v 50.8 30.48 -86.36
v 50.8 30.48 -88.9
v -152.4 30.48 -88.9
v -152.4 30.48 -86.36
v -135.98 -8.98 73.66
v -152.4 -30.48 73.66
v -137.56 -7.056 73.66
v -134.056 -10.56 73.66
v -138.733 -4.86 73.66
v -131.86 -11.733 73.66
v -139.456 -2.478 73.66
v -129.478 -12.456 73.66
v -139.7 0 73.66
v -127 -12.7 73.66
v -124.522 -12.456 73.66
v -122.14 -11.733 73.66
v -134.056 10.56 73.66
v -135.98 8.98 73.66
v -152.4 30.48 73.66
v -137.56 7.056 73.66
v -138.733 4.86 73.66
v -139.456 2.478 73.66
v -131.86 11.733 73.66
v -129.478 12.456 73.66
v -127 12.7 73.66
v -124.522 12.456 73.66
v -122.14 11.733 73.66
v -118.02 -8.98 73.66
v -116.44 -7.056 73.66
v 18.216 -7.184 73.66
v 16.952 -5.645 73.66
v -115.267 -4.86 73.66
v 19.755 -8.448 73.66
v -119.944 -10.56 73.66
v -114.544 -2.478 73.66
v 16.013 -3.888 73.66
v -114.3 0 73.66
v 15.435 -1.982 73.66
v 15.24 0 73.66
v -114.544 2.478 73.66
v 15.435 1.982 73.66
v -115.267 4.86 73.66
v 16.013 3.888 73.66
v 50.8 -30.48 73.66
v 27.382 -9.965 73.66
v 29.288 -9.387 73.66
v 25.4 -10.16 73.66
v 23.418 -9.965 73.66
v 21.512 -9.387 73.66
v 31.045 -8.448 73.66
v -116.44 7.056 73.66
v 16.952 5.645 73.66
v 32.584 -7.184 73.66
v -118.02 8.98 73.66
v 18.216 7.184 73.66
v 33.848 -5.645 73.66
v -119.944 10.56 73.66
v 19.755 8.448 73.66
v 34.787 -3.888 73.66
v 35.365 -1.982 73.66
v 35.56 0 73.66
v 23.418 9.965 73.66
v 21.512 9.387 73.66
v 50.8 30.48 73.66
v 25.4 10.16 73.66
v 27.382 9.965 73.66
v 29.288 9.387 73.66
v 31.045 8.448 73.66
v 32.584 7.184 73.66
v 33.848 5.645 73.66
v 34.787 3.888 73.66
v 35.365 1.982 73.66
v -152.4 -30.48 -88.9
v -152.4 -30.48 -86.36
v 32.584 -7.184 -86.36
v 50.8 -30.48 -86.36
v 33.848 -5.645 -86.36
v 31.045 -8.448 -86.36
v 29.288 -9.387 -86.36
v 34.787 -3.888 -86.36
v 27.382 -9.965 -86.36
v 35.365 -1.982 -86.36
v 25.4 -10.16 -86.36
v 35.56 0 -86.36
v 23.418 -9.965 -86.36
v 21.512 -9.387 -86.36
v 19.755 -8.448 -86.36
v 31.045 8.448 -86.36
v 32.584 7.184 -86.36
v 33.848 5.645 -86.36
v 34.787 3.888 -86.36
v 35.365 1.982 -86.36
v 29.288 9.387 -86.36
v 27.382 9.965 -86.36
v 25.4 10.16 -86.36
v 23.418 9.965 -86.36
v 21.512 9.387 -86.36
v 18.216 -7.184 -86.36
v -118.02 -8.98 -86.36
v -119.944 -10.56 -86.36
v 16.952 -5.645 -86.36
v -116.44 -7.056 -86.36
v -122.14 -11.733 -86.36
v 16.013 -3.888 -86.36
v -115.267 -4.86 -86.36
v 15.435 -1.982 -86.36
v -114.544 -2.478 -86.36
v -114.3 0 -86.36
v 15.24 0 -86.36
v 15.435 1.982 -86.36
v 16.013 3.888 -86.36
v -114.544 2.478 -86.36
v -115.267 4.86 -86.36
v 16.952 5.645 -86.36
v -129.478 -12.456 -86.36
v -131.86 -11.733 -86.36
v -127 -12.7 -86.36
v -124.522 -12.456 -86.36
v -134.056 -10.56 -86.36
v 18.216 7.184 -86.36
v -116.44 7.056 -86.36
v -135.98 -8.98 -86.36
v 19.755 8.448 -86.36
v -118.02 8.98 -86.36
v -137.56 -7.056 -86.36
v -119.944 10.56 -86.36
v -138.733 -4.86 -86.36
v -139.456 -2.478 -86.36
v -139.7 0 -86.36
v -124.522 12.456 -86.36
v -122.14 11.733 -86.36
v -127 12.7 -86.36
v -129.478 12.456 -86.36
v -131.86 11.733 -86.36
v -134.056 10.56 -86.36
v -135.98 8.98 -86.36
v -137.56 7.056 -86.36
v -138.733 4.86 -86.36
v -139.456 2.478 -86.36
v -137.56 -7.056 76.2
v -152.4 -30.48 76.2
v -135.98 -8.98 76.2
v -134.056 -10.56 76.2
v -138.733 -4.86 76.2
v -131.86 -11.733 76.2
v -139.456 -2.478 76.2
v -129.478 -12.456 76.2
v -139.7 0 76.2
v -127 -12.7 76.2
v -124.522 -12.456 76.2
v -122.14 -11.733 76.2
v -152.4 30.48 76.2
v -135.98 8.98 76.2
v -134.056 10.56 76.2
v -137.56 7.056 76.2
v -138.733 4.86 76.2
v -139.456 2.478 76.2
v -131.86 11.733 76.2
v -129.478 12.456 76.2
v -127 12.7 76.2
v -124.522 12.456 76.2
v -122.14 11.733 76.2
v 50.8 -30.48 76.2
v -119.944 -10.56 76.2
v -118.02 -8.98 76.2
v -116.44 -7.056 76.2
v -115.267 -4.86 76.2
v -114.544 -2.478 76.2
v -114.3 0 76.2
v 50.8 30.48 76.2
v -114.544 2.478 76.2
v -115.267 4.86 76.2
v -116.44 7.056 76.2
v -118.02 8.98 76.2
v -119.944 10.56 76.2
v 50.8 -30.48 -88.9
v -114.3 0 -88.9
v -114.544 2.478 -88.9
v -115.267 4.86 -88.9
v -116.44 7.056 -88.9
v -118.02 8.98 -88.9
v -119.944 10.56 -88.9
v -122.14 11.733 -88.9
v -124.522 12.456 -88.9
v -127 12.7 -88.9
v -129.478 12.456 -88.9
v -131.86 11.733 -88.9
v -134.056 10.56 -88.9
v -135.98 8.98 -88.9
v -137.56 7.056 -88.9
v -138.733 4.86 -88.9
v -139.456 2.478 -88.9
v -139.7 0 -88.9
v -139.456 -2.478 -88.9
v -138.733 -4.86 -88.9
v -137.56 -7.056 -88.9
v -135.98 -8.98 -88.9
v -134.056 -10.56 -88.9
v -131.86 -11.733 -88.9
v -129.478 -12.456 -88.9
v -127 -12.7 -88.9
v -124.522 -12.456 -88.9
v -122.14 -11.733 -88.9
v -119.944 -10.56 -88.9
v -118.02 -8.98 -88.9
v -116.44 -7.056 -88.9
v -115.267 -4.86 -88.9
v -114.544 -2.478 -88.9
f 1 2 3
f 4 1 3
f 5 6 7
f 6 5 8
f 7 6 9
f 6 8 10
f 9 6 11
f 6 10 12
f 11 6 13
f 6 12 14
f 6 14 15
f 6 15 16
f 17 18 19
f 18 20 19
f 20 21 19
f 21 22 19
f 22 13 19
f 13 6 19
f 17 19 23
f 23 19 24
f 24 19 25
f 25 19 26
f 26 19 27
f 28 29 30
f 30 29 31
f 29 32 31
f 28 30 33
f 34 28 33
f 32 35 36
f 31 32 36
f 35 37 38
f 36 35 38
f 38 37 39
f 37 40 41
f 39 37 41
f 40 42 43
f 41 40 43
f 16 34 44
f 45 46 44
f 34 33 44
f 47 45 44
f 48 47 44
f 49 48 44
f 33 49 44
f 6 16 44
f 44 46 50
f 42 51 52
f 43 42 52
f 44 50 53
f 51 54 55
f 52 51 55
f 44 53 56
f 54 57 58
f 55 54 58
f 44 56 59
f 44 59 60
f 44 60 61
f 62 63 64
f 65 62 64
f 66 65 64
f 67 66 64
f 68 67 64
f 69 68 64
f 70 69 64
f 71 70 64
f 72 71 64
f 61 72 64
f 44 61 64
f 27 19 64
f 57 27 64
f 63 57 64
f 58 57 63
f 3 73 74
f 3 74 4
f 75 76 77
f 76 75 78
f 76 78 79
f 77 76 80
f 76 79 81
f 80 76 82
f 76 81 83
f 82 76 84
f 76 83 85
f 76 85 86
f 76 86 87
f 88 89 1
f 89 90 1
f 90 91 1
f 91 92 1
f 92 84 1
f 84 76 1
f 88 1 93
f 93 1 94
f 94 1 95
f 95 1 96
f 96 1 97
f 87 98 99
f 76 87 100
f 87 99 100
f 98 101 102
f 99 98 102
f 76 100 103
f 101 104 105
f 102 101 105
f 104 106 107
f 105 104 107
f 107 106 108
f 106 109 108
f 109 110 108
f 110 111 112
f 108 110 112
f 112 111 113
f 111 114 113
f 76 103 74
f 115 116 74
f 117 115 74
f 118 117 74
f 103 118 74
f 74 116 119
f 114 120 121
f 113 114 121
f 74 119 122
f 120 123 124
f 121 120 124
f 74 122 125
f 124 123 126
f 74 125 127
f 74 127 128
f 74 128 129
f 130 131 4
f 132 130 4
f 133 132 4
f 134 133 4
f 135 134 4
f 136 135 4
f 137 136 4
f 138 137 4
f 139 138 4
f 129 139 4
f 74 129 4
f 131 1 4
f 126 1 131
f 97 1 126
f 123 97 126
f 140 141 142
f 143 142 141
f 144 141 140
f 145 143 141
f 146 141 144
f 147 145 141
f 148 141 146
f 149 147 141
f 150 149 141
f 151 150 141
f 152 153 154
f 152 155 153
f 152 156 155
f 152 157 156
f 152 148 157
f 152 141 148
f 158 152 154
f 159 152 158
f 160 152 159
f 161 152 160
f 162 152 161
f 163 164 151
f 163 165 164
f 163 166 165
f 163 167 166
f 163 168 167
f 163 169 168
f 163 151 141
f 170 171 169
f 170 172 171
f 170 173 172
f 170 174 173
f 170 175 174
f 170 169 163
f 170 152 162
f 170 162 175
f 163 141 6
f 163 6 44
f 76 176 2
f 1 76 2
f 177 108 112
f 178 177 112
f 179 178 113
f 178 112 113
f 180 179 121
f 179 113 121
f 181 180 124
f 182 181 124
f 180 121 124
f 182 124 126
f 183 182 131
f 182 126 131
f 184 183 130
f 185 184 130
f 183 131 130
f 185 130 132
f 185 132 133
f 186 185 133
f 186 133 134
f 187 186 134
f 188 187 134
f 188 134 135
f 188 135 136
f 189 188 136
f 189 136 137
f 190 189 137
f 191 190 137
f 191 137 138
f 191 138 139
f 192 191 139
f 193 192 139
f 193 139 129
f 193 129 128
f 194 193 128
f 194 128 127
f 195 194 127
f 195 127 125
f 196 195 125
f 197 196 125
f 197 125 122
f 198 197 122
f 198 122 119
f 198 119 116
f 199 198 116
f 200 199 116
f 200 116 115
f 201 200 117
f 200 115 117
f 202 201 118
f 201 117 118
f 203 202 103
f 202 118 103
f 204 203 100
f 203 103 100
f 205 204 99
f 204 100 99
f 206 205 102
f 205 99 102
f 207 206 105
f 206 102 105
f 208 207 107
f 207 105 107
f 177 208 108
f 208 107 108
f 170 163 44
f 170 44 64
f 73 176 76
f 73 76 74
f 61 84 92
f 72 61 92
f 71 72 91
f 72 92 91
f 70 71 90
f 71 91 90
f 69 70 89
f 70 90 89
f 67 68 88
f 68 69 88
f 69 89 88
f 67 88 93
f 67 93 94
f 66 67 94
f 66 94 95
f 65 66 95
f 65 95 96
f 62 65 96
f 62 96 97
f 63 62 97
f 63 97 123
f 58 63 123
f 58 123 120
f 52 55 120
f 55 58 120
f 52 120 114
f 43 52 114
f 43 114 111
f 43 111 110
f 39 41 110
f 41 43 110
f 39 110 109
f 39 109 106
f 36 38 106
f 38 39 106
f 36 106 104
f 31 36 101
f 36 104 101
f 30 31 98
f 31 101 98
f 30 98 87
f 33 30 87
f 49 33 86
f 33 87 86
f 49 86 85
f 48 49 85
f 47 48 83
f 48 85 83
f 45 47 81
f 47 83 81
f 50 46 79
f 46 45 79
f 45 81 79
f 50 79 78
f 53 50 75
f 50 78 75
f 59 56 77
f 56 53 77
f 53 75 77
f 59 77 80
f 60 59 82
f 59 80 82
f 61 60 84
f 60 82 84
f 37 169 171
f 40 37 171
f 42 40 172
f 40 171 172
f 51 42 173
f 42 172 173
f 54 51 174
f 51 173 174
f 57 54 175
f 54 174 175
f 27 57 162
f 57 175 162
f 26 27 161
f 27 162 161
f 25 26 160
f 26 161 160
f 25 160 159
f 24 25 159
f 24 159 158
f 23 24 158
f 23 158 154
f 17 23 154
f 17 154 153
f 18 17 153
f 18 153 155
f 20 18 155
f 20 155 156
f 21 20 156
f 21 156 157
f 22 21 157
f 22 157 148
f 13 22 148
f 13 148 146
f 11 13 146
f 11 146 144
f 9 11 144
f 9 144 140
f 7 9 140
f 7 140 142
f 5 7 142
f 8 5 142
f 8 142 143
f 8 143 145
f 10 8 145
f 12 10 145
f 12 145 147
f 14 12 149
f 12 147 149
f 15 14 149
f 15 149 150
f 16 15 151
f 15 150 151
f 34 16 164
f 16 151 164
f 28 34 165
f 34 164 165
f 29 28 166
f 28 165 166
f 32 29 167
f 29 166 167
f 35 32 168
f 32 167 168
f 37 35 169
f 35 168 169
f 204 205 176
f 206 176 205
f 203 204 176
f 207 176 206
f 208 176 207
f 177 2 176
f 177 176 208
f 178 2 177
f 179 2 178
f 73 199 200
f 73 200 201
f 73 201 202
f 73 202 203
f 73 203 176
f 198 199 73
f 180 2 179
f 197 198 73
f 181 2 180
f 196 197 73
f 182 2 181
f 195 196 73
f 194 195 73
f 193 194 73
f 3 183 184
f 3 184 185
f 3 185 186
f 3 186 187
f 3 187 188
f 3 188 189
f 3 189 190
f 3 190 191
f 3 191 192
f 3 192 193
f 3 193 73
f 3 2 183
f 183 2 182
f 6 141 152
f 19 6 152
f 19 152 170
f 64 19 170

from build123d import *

# Parameters (mm, degrees)
BOSS_EXTRUDE1_DEPTH      = 76.2
BOSS_EXTRUDE1_DEPTH_BACK = 88.9
SKETCH4_R                = 10.16
SKETCH7_W                = 203.2
SKETCH7_H                = 60.96
BOSS_EXTRUDE2_DEPTH      = 2.54
SKETCH8_W                = 203.2
SKETCH8_H                = 60.96
BOSS_EXTRUDE3_DEPTH      = 2.54
SKETCH9_R                = 12.7
CUT_EXTRUDE1_DEPTH       = 227.74390929


with BuildPart() as part:
    # Sketch4 → Boss-Extrude1 (new, two sides: drawn at the far end of the back side and taken through both)
    with BuildSketch(Plane.XY.offset(-BOSS_EXTRUDE1_DEPTH_BACK)):
        with Locations((25.4, 0)):
            Circle(SKETCH4_R)
    extrude(amount=BOSS_EXTRUDE1_DEPTH + BOSS_EXTRUDE1_DEPTH_BACK)

    # Sketch7 → Boss-Extrude2 (add)
    with BuildSketch(Plane(origin=(0, 0, -88.9), x_dir=(-1, 0, 0), z_dir=(0, 0, -1))):
        with Locations((50.8, 0)):
            Rectangle(SKETCH7_W, SKETCH7_H)
    extrude(amount=-BOSS_EXTRUDE2_DEPTH)

    # Sketch8 → Boss-Extrude3 (add)
    with BuildSketch(Plane.XY.offset(76.2)):
        with Locations((-50.8, 0)):
            Rectangle(SKETCH8_W, SKETCH8_H)
    extrude(amount=-BOSS_EXTRUDE3_DEPTH)

    # Sketch9 → Cut-Extrude1 (cut, through all)
    with BuildSketch(Plane.XY.offset(76.2)):
        with Locations((-127, 0)):
            Circle(SKETCH9_R)
    extrude(amount=-CUT_EXTRUDE1_DEPTH, mode=Mode.SUBTRACT)


solid = part.part
